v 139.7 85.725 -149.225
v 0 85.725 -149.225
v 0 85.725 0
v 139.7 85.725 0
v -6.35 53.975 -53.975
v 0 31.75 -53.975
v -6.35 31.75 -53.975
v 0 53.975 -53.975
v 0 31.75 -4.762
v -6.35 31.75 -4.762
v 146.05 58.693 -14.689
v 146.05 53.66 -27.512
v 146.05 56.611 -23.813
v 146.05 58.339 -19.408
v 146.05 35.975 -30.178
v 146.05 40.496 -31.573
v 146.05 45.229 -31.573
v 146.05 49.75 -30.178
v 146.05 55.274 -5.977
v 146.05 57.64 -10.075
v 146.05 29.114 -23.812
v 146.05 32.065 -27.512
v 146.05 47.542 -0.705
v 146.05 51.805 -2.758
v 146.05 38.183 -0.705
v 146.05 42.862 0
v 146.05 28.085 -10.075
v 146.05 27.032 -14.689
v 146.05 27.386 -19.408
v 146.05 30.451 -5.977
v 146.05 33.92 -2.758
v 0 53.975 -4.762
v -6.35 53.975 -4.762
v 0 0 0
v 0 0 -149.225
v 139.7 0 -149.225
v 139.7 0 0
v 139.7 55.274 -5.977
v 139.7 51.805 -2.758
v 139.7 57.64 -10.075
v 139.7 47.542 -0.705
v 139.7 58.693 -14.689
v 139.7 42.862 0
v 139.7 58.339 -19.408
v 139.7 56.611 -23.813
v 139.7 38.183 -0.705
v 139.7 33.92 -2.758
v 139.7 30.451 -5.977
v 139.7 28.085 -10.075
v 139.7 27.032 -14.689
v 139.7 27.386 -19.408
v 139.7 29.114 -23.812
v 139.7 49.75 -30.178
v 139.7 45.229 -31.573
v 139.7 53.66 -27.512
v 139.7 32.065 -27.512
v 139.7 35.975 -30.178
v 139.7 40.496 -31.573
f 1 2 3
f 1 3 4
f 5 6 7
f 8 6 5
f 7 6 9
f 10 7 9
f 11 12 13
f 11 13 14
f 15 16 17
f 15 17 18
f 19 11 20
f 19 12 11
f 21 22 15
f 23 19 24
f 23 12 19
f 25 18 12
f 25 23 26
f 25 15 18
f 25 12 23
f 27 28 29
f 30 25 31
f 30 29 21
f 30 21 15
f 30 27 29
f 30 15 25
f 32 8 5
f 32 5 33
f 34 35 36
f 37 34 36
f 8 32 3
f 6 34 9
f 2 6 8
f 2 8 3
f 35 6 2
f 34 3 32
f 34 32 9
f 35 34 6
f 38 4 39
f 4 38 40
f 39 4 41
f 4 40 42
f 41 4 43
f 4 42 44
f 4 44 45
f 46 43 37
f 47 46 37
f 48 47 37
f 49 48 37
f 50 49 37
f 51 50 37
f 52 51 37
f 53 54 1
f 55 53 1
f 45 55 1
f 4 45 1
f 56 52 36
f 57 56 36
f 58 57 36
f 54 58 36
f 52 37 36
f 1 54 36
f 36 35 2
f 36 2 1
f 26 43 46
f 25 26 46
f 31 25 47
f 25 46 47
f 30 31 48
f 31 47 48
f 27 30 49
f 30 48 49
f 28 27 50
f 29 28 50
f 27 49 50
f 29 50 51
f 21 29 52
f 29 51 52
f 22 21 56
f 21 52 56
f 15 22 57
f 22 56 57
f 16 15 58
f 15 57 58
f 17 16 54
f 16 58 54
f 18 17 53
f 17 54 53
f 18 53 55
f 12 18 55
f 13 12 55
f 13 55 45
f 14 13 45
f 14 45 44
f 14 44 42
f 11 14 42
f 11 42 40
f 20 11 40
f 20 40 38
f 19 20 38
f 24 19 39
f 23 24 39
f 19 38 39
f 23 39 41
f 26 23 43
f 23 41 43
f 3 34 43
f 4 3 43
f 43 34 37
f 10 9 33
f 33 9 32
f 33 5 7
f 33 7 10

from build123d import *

# Parameters (mm, degrees)
SKETCH1_W           = 139.7
SKETCH1_H           = 149.225
BOSS_EXTRUDE1_DEPTH = 85.725
SKETCH2_W           = 49.2125
SKETCH2_H           = 22.225
BOSS_EXTRUDE2_DEPTH = 6.35
SKETCH3_R           = 15.875
BOSS_EXTRUDE3_DEPTH = 6.35


with BuildPart() as part:
    # Sketch1 → Boss-Extrude1 (new body)
    with BuildSketch(Plane(origin=(0, 0, 0), x_dir=(1, 0, 0), z_dir=(0, 1, 0))):
        with Locations((69.85, 74.6125)):
            Rectangle(SKETCH1_W, SKETCH1_H)
    extrude(amount=BOSS_EXTRUDE1_DEPTH)

    # Sketch2 → Boss-Extrude2 (add)
    with BuildSketch(Plane.ZY):
        with Locations((-29.36875, 42.8625)):
            Rectangle(SKETCH2_W, SKETCH2_H)
    extrude(amount=BOSS_EXTRUDE2_DEPTH)

    # Sketch3 → Boss-Extrude3 (add)
    with BuildSketch(Plane(origin=(139.7, 0, 0), x_dir=(0, 0, -1), z_dir=(1, 0, 0))):
        with Locations(Location((15.875, 42.8625, 0), (0, 0, 180))):
            Circle(SKETCH3_R)
    extrude(amount=BOSS_EXTRUDE3_DEPTH)


solid = part.part
